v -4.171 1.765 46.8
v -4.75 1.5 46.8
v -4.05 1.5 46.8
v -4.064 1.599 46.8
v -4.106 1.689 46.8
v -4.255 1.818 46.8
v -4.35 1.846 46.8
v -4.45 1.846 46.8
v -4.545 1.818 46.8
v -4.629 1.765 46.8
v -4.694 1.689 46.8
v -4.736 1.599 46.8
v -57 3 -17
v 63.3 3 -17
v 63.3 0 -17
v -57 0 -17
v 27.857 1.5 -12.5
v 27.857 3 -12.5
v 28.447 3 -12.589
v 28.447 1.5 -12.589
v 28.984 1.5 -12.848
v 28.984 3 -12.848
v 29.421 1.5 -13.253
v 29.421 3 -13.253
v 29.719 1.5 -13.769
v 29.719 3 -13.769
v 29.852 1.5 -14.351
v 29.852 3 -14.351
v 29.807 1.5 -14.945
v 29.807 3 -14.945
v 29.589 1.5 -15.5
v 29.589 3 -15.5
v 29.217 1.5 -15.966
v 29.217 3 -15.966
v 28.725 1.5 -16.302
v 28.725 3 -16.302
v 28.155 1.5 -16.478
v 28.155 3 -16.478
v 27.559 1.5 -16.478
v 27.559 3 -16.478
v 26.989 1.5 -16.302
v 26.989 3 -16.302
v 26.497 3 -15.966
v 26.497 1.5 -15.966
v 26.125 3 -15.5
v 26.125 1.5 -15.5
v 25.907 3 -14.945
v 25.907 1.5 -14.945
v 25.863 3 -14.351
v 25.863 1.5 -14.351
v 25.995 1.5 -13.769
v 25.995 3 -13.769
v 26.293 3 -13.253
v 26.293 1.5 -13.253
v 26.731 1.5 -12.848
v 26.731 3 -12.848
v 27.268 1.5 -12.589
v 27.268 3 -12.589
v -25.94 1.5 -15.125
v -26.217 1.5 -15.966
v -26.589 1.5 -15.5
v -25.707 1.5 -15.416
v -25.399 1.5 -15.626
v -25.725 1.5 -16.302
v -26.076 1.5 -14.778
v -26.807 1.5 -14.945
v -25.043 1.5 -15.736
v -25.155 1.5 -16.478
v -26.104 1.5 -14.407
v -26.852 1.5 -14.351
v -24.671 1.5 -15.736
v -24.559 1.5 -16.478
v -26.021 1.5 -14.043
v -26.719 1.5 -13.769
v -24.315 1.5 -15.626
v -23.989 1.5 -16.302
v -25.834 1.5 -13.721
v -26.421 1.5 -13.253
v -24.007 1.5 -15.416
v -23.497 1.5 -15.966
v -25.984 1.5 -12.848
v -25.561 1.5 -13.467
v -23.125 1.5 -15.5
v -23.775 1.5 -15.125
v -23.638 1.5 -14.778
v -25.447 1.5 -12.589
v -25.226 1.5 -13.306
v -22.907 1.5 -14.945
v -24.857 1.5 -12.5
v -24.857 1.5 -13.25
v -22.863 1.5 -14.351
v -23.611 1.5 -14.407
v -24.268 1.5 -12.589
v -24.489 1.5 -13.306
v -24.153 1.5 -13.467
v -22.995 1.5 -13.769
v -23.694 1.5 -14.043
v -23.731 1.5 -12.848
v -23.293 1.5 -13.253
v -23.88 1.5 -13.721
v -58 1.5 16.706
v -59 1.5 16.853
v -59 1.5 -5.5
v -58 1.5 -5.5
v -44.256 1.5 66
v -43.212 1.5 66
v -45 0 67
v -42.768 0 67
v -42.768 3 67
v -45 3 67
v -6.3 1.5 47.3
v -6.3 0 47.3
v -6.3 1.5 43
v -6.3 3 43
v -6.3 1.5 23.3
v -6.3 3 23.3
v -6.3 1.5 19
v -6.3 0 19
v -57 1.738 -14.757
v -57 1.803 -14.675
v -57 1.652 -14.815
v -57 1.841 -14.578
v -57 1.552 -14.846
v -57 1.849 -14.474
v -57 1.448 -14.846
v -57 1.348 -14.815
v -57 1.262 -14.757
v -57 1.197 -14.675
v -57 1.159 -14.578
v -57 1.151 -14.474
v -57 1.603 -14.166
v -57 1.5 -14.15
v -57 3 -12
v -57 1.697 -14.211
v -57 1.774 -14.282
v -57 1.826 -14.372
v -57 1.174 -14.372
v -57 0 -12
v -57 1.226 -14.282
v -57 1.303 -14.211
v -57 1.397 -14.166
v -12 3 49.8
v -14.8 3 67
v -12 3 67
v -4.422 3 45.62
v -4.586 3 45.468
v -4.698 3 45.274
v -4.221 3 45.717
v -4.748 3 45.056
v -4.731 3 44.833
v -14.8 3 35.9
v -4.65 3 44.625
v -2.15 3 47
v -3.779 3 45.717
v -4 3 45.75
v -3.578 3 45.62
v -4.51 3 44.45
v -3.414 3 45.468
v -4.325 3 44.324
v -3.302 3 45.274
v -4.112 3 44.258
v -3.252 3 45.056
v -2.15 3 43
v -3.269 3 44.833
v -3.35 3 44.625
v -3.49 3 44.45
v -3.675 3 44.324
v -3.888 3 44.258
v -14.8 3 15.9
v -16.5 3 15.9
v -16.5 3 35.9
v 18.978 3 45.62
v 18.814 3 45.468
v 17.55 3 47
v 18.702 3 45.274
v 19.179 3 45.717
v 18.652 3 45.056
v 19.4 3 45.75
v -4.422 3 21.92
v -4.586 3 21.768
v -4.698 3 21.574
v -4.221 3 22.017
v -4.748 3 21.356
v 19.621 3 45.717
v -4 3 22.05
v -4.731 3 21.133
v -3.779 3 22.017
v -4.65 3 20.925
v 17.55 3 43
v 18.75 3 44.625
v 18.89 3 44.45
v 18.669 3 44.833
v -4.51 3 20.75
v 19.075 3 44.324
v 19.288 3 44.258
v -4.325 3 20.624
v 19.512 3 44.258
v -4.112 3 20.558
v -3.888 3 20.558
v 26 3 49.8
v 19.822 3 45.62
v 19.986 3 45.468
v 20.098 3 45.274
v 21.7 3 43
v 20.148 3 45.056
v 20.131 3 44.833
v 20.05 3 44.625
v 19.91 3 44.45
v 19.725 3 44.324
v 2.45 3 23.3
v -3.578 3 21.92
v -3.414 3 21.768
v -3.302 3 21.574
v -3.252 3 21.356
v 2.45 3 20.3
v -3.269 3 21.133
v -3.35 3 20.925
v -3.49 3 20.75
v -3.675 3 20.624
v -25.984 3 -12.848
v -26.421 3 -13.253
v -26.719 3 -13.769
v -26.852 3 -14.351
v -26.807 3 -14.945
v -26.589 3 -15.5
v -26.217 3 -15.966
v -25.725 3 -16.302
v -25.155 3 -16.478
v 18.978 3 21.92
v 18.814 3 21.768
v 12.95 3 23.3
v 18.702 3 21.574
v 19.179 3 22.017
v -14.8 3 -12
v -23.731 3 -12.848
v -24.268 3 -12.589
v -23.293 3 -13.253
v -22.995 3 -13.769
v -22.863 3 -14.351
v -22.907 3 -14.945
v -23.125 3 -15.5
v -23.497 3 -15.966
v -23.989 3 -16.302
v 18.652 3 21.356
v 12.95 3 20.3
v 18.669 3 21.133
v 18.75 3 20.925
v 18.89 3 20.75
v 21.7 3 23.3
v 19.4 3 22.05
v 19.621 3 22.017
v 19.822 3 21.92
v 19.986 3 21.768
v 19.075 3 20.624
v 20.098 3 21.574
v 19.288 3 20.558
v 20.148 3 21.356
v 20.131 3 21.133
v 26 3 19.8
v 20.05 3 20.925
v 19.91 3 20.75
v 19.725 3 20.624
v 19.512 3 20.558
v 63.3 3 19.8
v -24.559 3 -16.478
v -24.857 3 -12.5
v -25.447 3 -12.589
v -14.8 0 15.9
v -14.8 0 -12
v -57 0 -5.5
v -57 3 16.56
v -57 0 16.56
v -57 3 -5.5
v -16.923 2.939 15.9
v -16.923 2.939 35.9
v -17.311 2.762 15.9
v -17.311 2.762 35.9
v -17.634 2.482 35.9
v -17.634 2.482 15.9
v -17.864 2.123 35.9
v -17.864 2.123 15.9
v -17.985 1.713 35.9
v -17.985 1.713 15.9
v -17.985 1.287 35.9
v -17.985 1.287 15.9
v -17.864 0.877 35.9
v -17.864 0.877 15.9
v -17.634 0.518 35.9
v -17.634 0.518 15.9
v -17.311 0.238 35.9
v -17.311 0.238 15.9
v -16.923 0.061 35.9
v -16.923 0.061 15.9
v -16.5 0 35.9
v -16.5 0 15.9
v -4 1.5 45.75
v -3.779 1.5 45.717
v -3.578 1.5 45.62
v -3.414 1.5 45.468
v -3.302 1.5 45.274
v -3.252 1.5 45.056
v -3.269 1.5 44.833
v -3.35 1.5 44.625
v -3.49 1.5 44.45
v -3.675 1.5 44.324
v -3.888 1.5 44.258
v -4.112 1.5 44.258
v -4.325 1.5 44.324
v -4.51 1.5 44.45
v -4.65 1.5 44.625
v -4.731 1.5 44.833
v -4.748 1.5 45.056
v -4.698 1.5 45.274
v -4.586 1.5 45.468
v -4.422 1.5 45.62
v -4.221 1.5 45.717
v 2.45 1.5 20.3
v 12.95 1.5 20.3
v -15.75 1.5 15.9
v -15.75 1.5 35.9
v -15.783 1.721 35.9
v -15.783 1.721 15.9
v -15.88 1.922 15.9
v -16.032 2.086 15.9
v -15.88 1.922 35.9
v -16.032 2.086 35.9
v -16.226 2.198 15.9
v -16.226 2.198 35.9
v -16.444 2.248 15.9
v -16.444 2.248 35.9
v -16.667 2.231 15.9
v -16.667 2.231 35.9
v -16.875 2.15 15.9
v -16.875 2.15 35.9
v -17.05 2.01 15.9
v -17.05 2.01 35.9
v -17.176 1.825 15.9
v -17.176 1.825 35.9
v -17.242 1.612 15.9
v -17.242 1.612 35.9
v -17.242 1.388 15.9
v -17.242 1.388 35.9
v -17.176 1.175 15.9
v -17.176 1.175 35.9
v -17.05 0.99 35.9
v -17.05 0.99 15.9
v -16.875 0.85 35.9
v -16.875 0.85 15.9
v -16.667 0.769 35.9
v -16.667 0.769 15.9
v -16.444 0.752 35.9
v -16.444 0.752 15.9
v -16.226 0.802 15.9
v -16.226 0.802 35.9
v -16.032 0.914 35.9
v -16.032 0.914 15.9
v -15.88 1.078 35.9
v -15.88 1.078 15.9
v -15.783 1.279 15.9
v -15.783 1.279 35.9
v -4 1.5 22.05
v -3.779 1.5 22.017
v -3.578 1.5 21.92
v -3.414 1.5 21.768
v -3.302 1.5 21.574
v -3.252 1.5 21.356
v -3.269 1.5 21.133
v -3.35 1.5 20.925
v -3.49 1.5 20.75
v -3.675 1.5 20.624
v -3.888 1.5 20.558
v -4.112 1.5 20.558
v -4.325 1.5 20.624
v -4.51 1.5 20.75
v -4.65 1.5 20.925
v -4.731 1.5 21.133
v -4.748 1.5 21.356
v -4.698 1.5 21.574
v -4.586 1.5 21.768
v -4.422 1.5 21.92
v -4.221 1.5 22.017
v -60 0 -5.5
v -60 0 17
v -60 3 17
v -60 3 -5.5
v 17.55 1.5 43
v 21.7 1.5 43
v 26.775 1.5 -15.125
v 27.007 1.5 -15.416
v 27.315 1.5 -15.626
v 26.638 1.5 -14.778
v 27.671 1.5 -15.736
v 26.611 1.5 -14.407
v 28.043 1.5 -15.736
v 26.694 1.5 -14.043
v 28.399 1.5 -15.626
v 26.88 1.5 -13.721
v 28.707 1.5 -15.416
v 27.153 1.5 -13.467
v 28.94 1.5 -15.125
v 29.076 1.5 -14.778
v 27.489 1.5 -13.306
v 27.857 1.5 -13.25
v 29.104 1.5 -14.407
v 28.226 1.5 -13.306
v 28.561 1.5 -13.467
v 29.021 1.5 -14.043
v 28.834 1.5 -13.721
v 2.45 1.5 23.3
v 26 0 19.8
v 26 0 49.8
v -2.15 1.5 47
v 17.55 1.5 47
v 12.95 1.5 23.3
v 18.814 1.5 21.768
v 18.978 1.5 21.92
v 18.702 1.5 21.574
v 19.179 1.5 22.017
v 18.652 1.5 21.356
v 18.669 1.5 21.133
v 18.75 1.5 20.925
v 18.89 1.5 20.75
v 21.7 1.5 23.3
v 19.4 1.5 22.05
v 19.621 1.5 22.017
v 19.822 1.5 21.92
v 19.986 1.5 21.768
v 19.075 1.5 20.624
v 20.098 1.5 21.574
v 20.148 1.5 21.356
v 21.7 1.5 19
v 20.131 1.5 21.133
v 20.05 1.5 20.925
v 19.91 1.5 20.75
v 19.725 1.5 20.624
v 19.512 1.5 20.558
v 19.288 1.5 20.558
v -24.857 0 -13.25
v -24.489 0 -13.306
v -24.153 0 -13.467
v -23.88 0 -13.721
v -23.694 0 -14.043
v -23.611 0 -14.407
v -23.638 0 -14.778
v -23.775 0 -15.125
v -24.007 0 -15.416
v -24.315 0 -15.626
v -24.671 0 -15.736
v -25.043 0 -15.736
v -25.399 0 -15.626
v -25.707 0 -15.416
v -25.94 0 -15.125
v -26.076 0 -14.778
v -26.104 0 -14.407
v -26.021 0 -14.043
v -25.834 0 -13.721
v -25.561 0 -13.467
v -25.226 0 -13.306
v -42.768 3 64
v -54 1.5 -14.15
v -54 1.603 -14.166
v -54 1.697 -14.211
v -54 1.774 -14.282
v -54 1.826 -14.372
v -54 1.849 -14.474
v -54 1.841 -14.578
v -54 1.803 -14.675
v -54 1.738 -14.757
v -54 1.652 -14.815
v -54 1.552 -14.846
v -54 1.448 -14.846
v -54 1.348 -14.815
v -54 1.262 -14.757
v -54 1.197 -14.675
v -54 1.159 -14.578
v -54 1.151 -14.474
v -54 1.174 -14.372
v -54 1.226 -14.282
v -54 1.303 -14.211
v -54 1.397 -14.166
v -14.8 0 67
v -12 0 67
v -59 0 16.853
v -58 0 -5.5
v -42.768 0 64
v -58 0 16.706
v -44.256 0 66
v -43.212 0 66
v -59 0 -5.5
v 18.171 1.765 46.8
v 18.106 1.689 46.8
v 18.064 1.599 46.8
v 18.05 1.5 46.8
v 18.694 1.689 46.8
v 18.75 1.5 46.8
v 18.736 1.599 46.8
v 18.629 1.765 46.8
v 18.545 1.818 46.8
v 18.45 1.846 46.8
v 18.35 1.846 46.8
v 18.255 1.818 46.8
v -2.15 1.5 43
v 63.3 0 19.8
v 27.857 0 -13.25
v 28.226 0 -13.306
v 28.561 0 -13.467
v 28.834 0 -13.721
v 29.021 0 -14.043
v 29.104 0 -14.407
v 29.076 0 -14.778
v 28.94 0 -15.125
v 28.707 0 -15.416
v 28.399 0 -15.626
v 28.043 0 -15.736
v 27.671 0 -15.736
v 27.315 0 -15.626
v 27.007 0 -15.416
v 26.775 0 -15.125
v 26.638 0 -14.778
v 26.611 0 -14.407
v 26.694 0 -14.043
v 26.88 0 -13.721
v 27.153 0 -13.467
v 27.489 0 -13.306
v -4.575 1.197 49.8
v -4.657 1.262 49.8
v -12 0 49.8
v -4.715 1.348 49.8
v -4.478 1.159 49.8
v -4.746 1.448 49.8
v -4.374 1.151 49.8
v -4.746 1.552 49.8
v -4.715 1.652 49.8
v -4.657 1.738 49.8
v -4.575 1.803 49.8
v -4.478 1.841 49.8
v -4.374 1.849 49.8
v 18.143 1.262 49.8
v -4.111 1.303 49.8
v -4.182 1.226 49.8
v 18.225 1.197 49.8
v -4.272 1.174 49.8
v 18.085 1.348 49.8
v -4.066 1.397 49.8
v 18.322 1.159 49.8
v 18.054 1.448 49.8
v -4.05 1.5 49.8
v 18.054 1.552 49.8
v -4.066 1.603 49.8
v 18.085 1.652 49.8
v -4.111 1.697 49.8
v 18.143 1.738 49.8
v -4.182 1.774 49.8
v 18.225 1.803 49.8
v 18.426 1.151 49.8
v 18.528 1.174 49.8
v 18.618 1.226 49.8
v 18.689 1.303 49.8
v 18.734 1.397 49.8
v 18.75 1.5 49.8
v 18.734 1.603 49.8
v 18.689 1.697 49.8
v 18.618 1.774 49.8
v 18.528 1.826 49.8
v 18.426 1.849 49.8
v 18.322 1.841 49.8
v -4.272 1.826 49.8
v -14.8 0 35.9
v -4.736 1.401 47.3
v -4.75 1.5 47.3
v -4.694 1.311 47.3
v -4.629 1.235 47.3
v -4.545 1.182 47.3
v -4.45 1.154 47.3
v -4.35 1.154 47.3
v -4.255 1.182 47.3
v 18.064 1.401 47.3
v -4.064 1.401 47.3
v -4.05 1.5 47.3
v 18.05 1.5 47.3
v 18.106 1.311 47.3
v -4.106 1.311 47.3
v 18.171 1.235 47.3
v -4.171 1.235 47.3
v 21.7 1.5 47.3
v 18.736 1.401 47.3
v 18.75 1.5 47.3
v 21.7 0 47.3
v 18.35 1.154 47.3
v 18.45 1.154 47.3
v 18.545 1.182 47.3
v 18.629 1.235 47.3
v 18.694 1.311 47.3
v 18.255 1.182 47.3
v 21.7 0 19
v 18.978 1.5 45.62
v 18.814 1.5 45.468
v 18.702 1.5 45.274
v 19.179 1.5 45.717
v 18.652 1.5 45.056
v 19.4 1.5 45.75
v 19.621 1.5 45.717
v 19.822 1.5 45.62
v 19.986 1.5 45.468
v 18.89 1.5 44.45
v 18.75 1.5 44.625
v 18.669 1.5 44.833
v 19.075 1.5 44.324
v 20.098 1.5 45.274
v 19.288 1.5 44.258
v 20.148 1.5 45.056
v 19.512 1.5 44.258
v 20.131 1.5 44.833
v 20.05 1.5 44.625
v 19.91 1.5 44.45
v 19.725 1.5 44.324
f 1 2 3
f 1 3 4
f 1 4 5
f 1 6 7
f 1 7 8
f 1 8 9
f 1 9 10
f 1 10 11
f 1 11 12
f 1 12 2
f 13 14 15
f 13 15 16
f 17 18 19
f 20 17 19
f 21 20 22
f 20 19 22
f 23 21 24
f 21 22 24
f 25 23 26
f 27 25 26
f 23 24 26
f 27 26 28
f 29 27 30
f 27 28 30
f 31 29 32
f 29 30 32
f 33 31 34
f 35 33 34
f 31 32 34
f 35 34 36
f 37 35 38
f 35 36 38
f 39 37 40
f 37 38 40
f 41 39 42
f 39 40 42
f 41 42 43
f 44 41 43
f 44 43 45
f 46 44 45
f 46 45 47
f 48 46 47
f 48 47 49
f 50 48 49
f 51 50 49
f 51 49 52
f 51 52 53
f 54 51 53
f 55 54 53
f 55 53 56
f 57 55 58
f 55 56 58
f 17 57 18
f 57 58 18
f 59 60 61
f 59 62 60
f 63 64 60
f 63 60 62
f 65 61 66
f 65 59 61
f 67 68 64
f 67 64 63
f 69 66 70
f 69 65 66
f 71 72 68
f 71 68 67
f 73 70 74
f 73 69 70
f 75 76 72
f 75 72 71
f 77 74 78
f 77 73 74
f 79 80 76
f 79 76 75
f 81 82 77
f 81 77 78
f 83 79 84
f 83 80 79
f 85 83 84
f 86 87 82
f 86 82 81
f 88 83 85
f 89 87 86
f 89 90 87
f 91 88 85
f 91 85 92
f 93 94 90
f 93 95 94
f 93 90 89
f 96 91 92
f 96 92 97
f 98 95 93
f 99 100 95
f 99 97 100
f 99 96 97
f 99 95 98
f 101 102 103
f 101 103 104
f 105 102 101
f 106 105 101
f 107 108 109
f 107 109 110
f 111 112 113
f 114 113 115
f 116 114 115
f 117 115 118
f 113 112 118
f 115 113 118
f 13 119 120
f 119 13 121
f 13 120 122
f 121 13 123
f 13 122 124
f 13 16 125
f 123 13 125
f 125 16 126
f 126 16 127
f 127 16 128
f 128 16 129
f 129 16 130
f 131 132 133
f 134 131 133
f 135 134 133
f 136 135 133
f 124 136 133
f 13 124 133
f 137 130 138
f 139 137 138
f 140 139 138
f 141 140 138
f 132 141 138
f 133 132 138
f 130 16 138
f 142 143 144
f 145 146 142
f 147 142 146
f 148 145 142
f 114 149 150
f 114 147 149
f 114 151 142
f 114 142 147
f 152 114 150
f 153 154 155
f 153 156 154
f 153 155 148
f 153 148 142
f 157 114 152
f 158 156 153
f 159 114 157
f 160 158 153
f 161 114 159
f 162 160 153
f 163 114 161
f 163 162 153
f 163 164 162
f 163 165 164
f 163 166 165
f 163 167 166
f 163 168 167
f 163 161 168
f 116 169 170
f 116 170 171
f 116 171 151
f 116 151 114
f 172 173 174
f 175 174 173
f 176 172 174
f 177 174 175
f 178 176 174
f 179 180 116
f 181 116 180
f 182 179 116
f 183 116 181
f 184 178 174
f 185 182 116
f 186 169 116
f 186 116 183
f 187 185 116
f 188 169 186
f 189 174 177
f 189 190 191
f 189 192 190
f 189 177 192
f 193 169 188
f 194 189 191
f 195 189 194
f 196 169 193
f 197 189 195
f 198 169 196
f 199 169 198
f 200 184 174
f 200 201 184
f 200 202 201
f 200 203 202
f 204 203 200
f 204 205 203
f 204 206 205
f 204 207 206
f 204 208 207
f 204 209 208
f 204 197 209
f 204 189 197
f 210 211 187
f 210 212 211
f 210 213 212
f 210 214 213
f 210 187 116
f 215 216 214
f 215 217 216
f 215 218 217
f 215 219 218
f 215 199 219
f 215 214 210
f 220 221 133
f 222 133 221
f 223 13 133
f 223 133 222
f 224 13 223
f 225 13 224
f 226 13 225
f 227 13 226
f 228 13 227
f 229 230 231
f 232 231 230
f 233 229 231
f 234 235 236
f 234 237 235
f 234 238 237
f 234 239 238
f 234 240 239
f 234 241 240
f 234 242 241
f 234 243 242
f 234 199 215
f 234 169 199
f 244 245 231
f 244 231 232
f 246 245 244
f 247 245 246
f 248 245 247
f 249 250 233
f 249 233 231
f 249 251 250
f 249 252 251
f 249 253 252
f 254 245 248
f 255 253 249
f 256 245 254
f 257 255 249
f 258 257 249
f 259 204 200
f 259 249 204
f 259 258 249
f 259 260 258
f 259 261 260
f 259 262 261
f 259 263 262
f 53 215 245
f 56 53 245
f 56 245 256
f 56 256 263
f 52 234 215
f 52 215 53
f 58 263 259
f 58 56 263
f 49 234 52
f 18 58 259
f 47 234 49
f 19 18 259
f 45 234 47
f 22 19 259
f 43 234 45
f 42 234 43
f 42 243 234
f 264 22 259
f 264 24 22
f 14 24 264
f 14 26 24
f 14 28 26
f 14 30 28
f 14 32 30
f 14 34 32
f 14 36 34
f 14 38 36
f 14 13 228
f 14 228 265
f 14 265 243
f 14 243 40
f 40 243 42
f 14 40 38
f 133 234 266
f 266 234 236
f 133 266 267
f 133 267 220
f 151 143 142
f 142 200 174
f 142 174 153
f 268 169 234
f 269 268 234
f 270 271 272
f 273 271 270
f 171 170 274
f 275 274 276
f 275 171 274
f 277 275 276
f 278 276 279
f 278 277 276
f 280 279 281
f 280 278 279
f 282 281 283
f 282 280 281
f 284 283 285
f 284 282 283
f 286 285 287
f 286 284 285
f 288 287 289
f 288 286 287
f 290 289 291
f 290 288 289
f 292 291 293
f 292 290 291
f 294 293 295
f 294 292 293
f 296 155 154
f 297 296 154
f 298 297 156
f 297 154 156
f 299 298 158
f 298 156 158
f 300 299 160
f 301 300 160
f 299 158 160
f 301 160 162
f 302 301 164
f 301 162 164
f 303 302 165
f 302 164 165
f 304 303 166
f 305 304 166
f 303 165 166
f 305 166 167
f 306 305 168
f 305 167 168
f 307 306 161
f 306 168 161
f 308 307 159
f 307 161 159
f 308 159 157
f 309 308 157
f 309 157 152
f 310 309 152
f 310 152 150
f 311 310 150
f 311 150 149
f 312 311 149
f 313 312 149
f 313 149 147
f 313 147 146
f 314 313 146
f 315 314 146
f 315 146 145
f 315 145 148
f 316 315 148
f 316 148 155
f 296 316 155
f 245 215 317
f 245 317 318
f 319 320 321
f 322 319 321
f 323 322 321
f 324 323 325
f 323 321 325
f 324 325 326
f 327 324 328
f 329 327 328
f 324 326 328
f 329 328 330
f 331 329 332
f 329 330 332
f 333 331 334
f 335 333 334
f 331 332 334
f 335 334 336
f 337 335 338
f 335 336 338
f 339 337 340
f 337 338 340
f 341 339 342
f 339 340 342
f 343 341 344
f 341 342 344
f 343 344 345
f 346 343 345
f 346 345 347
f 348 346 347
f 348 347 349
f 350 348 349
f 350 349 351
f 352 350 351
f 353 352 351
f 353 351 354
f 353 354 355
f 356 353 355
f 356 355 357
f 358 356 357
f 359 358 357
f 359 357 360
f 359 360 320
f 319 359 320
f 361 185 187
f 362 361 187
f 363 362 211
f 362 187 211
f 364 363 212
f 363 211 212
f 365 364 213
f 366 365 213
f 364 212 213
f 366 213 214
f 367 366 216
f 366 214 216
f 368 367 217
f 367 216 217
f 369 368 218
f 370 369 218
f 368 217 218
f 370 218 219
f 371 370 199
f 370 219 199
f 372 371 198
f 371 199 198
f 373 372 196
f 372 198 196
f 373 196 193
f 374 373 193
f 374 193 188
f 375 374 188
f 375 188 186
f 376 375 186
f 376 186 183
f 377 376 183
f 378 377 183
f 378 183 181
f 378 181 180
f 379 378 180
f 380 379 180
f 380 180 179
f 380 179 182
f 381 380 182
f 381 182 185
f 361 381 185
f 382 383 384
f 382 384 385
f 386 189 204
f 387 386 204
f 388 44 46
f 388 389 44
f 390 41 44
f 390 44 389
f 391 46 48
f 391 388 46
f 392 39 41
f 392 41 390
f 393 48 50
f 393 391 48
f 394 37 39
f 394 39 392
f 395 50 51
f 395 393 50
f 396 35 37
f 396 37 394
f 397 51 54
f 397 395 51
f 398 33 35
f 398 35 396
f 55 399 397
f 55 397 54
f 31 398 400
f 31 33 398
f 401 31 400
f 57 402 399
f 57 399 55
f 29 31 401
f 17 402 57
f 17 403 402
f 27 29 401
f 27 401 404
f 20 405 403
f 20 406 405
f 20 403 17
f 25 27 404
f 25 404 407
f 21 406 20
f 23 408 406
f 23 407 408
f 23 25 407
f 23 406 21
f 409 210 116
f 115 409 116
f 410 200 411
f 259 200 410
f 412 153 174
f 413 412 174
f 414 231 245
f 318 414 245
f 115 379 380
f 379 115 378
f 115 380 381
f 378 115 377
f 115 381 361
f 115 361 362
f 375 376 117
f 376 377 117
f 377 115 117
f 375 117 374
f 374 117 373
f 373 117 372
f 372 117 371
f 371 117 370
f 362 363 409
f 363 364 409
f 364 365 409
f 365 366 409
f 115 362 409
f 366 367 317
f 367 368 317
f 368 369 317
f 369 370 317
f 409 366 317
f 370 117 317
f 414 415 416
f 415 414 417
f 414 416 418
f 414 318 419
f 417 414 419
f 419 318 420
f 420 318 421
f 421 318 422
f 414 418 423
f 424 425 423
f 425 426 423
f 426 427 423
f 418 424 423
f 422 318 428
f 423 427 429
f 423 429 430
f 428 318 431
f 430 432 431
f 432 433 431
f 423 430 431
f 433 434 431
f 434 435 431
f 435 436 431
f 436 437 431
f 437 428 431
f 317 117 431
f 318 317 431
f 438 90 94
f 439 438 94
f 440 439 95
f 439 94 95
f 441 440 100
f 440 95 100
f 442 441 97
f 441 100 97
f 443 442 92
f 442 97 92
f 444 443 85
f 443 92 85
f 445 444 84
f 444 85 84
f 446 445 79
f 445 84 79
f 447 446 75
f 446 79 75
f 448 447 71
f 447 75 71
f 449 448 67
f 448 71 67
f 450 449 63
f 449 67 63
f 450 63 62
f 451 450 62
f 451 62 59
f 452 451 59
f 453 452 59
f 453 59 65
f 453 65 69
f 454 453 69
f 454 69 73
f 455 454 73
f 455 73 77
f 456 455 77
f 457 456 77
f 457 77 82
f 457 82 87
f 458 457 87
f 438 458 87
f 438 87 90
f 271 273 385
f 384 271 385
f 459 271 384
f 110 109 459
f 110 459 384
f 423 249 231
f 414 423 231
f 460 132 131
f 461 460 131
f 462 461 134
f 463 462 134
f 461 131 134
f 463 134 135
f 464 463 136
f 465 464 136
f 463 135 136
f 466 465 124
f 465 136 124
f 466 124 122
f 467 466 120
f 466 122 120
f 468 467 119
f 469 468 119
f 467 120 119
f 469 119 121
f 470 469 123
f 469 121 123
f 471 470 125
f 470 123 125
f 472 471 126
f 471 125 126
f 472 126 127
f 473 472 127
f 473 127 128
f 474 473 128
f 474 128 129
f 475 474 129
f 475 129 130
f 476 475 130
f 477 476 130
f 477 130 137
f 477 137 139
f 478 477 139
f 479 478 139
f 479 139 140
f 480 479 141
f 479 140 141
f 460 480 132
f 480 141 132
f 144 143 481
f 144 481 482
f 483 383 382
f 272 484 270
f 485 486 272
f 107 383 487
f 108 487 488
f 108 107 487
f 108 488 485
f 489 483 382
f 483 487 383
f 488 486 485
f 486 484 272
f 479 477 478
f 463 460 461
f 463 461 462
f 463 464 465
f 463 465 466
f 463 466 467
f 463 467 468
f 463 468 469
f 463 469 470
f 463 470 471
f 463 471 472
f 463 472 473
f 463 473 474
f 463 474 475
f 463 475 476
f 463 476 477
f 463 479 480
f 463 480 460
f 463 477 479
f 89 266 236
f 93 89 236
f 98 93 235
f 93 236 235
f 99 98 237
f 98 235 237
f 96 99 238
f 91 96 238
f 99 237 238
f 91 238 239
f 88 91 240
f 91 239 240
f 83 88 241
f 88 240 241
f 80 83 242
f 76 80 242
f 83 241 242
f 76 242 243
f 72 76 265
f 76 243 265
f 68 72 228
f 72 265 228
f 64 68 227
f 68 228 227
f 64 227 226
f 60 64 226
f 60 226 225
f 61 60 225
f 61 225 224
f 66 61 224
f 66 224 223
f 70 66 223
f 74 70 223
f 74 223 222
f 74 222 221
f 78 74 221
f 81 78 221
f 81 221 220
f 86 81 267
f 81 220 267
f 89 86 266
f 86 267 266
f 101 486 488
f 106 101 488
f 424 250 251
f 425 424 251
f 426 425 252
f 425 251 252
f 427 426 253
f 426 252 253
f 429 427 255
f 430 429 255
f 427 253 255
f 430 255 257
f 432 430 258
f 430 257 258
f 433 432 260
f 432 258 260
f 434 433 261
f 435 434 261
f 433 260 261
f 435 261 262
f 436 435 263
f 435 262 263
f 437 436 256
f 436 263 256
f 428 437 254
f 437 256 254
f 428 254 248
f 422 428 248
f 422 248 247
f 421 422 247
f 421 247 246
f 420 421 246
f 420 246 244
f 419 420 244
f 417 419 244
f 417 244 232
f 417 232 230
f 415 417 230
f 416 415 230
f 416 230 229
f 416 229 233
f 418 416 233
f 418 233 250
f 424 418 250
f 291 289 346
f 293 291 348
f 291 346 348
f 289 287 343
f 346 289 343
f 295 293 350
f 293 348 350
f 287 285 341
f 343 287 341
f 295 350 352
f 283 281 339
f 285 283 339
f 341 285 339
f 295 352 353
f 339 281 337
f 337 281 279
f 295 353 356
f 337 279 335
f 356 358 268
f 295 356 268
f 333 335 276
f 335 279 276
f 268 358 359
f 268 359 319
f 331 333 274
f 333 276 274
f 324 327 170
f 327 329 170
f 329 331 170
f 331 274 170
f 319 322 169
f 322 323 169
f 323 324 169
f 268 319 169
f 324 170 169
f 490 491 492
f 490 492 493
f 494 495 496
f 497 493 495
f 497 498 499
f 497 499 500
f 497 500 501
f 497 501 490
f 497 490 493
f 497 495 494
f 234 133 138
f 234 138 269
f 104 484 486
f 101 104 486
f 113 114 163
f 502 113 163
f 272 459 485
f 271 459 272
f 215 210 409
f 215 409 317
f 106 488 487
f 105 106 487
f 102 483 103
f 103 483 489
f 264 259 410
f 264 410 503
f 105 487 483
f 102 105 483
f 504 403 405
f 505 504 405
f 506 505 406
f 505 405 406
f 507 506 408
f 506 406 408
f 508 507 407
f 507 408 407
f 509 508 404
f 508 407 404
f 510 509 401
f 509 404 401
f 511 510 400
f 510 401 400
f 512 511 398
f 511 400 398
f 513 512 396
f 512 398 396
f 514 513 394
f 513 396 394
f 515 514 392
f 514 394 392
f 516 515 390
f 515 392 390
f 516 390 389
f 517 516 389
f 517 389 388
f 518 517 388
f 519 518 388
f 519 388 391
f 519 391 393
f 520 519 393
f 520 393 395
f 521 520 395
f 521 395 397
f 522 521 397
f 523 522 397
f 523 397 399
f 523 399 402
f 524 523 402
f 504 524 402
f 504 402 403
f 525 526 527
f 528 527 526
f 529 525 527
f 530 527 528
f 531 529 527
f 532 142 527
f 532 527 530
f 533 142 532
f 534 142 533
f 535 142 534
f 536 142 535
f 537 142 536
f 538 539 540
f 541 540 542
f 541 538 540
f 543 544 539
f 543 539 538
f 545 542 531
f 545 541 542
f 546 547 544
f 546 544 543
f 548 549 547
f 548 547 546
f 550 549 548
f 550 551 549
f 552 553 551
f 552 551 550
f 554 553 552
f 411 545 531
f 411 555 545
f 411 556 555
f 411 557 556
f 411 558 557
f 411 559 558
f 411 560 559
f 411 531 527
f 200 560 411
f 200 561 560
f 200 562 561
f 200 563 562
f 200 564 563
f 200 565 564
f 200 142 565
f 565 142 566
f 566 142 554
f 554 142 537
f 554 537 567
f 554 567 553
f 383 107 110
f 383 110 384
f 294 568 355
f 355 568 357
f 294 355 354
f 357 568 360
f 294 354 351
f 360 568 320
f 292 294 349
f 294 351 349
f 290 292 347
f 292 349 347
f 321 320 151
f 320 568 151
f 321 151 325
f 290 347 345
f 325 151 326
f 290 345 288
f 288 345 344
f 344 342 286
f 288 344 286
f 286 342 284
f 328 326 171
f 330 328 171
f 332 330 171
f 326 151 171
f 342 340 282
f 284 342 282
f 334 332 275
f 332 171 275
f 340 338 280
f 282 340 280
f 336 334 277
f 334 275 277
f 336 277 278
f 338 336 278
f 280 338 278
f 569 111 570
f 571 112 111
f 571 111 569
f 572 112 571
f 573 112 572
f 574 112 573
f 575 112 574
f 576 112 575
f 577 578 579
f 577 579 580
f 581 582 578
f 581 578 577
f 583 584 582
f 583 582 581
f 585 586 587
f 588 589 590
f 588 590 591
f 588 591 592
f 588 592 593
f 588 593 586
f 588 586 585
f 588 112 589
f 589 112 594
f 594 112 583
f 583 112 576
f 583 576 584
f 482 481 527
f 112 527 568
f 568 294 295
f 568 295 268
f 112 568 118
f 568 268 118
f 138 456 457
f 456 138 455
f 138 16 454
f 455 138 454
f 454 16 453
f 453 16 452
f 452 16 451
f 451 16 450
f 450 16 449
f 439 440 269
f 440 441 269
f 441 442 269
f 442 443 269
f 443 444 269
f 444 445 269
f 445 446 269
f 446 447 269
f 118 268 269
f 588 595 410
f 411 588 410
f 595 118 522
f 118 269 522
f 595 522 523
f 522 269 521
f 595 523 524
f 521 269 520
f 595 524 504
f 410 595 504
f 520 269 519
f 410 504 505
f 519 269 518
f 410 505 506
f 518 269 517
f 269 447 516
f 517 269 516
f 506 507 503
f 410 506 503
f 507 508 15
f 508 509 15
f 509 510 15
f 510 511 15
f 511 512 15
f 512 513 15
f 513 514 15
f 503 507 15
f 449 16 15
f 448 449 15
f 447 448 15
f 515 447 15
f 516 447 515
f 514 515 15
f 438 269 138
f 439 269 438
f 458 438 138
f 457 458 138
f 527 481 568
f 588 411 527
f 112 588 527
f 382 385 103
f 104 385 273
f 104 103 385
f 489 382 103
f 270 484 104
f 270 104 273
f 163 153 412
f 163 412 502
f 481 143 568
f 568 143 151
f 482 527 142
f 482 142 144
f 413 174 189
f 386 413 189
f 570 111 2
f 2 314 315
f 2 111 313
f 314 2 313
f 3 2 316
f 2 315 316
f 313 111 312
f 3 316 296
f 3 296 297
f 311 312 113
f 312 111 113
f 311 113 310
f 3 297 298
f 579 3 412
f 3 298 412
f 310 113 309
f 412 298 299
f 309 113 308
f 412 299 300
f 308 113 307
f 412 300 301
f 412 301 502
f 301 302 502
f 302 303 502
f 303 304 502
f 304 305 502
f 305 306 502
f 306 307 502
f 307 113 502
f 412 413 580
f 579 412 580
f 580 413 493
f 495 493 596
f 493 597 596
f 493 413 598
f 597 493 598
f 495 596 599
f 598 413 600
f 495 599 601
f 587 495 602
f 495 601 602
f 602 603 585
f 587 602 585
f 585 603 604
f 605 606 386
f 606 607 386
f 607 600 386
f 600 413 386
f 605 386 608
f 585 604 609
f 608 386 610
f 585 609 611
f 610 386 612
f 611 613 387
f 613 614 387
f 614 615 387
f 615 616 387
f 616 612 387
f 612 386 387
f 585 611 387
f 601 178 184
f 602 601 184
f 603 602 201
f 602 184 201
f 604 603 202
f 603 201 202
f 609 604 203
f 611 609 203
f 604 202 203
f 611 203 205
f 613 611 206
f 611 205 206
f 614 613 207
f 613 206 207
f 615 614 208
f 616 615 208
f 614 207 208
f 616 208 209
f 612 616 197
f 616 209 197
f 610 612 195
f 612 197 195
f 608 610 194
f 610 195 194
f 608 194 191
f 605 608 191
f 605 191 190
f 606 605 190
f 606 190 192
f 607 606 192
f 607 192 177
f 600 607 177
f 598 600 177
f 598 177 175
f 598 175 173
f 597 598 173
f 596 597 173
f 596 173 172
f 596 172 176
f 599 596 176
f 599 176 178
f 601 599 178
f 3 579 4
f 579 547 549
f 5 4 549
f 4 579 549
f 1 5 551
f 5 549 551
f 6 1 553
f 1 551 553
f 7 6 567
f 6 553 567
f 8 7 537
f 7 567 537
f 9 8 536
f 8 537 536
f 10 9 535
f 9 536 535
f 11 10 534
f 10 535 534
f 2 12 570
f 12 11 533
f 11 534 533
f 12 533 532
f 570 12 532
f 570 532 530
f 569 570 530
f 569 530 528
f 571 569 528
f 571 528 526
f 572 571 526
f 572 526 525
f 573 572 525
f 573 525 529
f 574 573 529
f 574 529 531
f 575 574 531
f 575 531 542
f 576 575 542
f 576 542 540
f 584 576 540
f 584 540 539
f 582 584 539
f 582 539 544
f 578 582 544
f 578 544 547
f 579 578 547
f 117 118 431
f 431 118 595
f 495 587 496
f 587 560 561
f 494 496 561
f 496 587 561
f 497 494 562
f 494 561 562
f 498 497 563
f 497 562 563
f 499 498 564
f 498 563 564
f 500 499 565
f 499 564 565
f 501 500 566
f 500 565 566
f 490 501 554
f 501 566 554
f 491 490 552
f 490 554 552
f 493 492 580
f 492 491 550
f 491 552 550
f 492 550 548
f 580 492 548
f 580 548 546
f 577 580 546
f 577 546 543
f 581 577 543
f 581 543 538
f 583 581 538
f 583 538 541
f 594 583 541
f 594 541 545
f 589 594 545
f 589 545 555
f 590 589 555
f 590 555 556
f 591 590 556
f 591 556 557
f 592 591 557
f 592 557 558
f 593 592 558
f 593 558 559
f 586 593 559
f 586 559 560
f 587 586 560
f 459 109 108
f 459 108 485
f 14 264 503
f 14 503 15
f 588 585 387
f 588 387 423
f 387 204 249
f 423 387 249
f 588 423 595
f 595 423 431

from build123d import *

# Parameters (mm, degrees)
SKETCH_1_W           = 120
SKETCH_1_H           = 34
EXTRUDE_1_DEPTH      = 3
SKETCH_2_R           = 1.25
CUT_EXTRUDE_1_DEPTH  = 63.433965115
SKETCH_2_3_R         = 2
CUT_EXTRUDE_2_DEPTH  = 1.5
EXTRUDE_2_DEPTH      = 3
SKETCH_5_W           = 27.767908047
SKETCH_5_H           = 3
CUT_EXTRUDE_3_DEPTH  = 90.988888203
SKETCH_6_R           = 1.5
SKETCH_6_R_2         = 0.75
EXTRUDE_3_DEPTH      = 79
SKETCH_7_W           = 1.5
SKETCH_7_H           = 3.2
SKETCH_7_W_2         = 1.7
SKETCH_7_H_2         = 27.900089606
SKETCH_7_H_3         = 27.899910394
CUT_EXTRUDE_5_DEPTH  = 90.988888203
SKETCH_9_W           = 3
SKETCH_9_H           = 11.5
CUT_EXTRUDE_8_DEPTH  = 90.988888203
CUT_EXTRUDE_9_DEPTH  = 1.5
SKETCH_12_R          = 0.35
CUT_EXTRUDE_10_DEPTH = 3
EXTRUDE_4_DEPTH      = 3
SKETCH_13_R          = 0.75
CUT_EXTRUDE_11_DEPTH = 93.221960508
SKETCH_15_W          = 19.7
SKETCH_15_H          = 4
SKETCH_15_W_2        = 10.5
SKETCH_15_H_2        = 3
CUT_EXTRUDE_14_DEPTH = 93.221960508
SKETCH_16_W          = 28
SKETCH_16_H          = 28.3
CUT_EXTRUDE_15_DEPTH = 1.5
SKETCH_18_R          = 0.35
CUT_EXTRUDE_16_DEPTH = 3


with BuildPart() as part:
    # 草图1 → 凸台-拉伸1 (new body)
    with BuildSketch(Plane(origin=(0, 0, 0), x_dir=(1, 0, 0), z_dir=(0, 1, 0))):
        Rectangle(SKETCH_1_W, SKETCH_1_H)
    extrude(amount=EXTRUDE_1_DEPTH)

    # 草图2 → 切除-拉伸1 (cut, through all)
    with BuildSketch(Plane(origin=(0, 3, 0), x_dir=(1, 0, 0), z_dir=(0, 1, 0))):
        with Locations(Location((-24.857141963, 14.500000041, 0), (0, 0, 270))):
            Circle(SKETCH_2_R)
        with Locations(Location((27.857143751, 14.500000041, 0), (0, 0, 270))):
            Circle(SKETCH_2_R)
    extrude(amount=-CUT_EXTRUDE_1_DEPTH, mode=Mode.SUBTRACT)

    # 草图2<3> → 切除-拉伸2 (cut)
    with BuildSketch(Plane(origin=(0, 3, 0), x_dir=(1, 0, 0), z_dir=(0, 1, 0))):
        with Locations(Location((-24.857141963, 14.500000041, 0), (0, 0, 270))):
            Circle(SKETCH_2_3_R)
        with Locations(Location((27.857143751, 14.500000041, 0), (0, 0, 270))):
            Circle(SKETCH_2_3_R)
    extrude(amount=-CUT_EXTRUDE_2_DEPTH, mode=Mode.SUBTRACT)

    # 草图4 → 凸台-拉伸2 (add)
    with BuildSketch(Plane(origin=(0, 0, 0), x_dir=(1, 0, 0), z_dir=(0, 1, 0))):
        Polygon((-12, -17), (-12, -67), (-45, -67), (-60, -17), align=None)
    extrude(amount=EXTRUDE_2_DEPTH)

    # 草图5 → 切除-拉伸3 (cut, through all)
    with BuildSketch(Plane(origin=(0, 3, 0), x_dir=(1, 0, 0), z_dir=(0, 1, 0))):
        Polygon((-42.767908047, -64), (-57, -16.559693491), (-57, 12), (-15, 12), (-15, -64), align=None)
        with Locations((-28.883954024, -65.5)):
            Rectangle(SKETCH_5_W, SKETCH_5_H)
    extrude(amount=-CUT_EXTRUDE_3_DEPTH, mode=Mode.SUBTRACT)

    # 草图6 → 凸台-拉伸3 (add)
    # profile 1 of 3: a face of its own
    with BuildSketch(Plane.XY.offset(67)):
        with Locations((-16.5, 1.5)):
            Circle(SKETCH_6_R)
        with Locations((-16.5, 1.5)):
            Circle(SKETCH_6_R_2, mode=Mode.SUBTRACT)
    # profile 2 of 3: a face of its own
    with BuildSketch(Plane.XY.offset(67)):
        with BuildLine():
            Line((-15, 1.5), (-15, 3))
            Line((-15, 3), (-16.5, 3))
            ThreePointArc((-16.5, 3), (-15.439339828, 2.560660172), (-15, 1.5))
        make_face()
    # profile 3 of 3: a face of its own
    with BuildSketch(Plane.XY.offset(67)):
        with BuildLine():
            Line((-15, 0), (-15, 1.5))
            ThreePointArc((-15, 1.5), (-15.439339828, 0.439339828), (-16.5, 0))
            Line((-16.5, 0), (-15, 0))
        make_face()
    extrude(amount=-EXTRUDE_3_DEPTH)

    # 草图7 → 切除-拉伸5 (cut, through all)
    with BuildSketch(Plane(origin=(0, 3, 0), x_dir=(1, 0, 0), z_dir=(0, 1, 0))):
        with Locations((-17.25, -65.4)):
            Rectangle(SKETCH_7_W, SKETCH_7_H)
        with Locations((-15.65, -65.4)):
            Rectangle(SKETCH_7_W_2, SKETCH_7_H)
        with Locations((-15.65, -49.849955197)):
            Rectangle(SKETCH_7_W_2, SKETCH_7_H_2)
        with Locations((-17.25, -49.849955197)):
            Rectangle(SKETCH_7_W, SKETCH_7_H_2)
        with Locations((-15.65, -1.949955197)):
            Rectangle(SKETCH_7_W_2, SKETCH_7_H_3)
        with Locations((-17.25, -1.949955197)):
            Rectangle(SKETCH_7_W, SKETCH_7_H_3)
    extrude(amount=-CUT_EXTRUDE_5_DEPTH, mode=Mode.SUBTRACT)

    # 草图9 → 切除-拉伸8 (cut, through all)
    with BuildSketch(Plane.XZ):
        with Locations((-58.5, -11.25)):
            Rectangle(SKETCH_9_W, SKETCH_9_H)
    extrude(amount=-CUT_EXTRUDE_8_DEPTH, mode=Mode.SUBTRACT)


with BuildPart() as cut_extrude_8_piece_1:
    # of the separate pieces the step leaves, piece 1, a body of its own (cut_extrude_8_pieces)
    add(part.part.solids().sort_by_distance((-12, 0, 17))[0])

    # 草图12 → 切除-拉伸10 (cut)
    with BuildSketch(Plane.ZY.offset(57)):
        with Locations((-14.5, 1.5)):
            Circle(SKETCH_12_R)
    extrude(amount=-CUT_EXTRUDE_10_DEPTH, mode=Mode.SUBTRACT)

    # 草图17 → 凸台-拉伸4 (add)
    with BuildSketch(Plane(origin=(0, 3, 0), x_dir=(1, 0, 0), z_dir=(0, 1, 0))):
        Polygon((63.3, 17), (60, 17), (60, -17), (-12, -17), (-12, -49.8), (26, -49.8), (26, -19.8), (63.3, -19.8), align=None)
    extrude(amount=-EXTRUDE_4_DEPTH)

    # 草图13 → 切除-拉伸11 (cut, through all)
    with BuildSketch(Plane(origin=(0, 3, 0), x_dir=(1, 0, 0), z_dir=(0, 1, 0))):
        with Locations(Location((19.4, -45, 0), (0, 0, 270))):
            Circle(SKETCH_13_R)
        with Locations(Location((-4, -45, 0), (0, 0, 270))):
            Circle(SKETCH_13_R)
        with Locations(Location((19.4, -21.3, 0), (0, 0, 270))):
            Circle(SKETCH_13_R)
        with Locations(Location((-4, -21.3, 0), (0, 0, 270))):
            Circle(SKETCH_13_R)
    extrude(amount=-CUT_EXTRUDE_11_DEPTH, mode=Mode.SUBTRACT)

    # 草图15 → 切除-拉伸14 (cut, through all)
    with BuildSketch(Plane(origin=(0, 3, 0), x_dir=(1, 0, 0), z_dir=(0, 1, 0))):
        Polygon((-2.15, -43), (17.55, -43), (21.7, -43), (21.7, -23.3), (12.95, -23.3), (2.45, -23.3), (-6.3, -23.3), (-6.3, -43), align=None)
        with Locations((7.7, -45)):
            Rectangle(SKETCH_15_W, SKETCH_15_H)
        with Locations((7.7, -21.8)):
            Rectangle(SKETCH_15_W_2, SKETCH_15_H_2)
    extrude(amount=-CUT_EXTRUDE_14_DEPTH, mode=Mode.SUBTRACT)

    # 草图16 → 切除-拉伸15 (cut)
    with BuildSketch(Plane(origin=(0, 0, 0), x_dir=(1, 0, 0), z_dir=(0, 1, 0))):
        with Locations((7.7, -33.15)):
            Rectangle(SKETCH_16_W, SKETCH_16_H)
    extrude(amount=CUT_EXTRUDE_15_DEPTH, mode=Mode.SUBTRACT)

    # 草图18 → 切除-拉伸16 (cut)
    with BuildSketch(Plane.XY.offset(49.8)):
        with Locations((18.4, 1.5)):
            Circle(SKETCH_18_R)
        with Locations((-4.4, 1.5)):
            Circle(SKETCH_18_R)
    extrude(amount=-CUT_EXTRUDE_16_DEPTH, mode=Mode.SUBTRACT)


with BuildPart() as cut_extrude_8_piece_2:
    # of the separate pieces the step leaves, piece 2, a body of its own (cut_extrude_8_pieces)
    add(part.part.solids().sort_by_distance((-57, 0, -5.5))[0])

    # 草图10 → 切除-拉伸9 (cut)
    with BuildSketch(Plane.XZ):
        Polygon((-58, -5.5), (-58, 16.706462327), (-43.211938698, 66), (-44.255969349, 66), (-59, 16.853231164), (-59, -5.5), align=None)
    extrude(amount=-CUT_EXTRUDE_9_DEPTH, mode=Mode.SUBTRACT)


solid = Compound([cut_extrude_8_piece_1.part, cut_extrude_8_piece_2.part])
